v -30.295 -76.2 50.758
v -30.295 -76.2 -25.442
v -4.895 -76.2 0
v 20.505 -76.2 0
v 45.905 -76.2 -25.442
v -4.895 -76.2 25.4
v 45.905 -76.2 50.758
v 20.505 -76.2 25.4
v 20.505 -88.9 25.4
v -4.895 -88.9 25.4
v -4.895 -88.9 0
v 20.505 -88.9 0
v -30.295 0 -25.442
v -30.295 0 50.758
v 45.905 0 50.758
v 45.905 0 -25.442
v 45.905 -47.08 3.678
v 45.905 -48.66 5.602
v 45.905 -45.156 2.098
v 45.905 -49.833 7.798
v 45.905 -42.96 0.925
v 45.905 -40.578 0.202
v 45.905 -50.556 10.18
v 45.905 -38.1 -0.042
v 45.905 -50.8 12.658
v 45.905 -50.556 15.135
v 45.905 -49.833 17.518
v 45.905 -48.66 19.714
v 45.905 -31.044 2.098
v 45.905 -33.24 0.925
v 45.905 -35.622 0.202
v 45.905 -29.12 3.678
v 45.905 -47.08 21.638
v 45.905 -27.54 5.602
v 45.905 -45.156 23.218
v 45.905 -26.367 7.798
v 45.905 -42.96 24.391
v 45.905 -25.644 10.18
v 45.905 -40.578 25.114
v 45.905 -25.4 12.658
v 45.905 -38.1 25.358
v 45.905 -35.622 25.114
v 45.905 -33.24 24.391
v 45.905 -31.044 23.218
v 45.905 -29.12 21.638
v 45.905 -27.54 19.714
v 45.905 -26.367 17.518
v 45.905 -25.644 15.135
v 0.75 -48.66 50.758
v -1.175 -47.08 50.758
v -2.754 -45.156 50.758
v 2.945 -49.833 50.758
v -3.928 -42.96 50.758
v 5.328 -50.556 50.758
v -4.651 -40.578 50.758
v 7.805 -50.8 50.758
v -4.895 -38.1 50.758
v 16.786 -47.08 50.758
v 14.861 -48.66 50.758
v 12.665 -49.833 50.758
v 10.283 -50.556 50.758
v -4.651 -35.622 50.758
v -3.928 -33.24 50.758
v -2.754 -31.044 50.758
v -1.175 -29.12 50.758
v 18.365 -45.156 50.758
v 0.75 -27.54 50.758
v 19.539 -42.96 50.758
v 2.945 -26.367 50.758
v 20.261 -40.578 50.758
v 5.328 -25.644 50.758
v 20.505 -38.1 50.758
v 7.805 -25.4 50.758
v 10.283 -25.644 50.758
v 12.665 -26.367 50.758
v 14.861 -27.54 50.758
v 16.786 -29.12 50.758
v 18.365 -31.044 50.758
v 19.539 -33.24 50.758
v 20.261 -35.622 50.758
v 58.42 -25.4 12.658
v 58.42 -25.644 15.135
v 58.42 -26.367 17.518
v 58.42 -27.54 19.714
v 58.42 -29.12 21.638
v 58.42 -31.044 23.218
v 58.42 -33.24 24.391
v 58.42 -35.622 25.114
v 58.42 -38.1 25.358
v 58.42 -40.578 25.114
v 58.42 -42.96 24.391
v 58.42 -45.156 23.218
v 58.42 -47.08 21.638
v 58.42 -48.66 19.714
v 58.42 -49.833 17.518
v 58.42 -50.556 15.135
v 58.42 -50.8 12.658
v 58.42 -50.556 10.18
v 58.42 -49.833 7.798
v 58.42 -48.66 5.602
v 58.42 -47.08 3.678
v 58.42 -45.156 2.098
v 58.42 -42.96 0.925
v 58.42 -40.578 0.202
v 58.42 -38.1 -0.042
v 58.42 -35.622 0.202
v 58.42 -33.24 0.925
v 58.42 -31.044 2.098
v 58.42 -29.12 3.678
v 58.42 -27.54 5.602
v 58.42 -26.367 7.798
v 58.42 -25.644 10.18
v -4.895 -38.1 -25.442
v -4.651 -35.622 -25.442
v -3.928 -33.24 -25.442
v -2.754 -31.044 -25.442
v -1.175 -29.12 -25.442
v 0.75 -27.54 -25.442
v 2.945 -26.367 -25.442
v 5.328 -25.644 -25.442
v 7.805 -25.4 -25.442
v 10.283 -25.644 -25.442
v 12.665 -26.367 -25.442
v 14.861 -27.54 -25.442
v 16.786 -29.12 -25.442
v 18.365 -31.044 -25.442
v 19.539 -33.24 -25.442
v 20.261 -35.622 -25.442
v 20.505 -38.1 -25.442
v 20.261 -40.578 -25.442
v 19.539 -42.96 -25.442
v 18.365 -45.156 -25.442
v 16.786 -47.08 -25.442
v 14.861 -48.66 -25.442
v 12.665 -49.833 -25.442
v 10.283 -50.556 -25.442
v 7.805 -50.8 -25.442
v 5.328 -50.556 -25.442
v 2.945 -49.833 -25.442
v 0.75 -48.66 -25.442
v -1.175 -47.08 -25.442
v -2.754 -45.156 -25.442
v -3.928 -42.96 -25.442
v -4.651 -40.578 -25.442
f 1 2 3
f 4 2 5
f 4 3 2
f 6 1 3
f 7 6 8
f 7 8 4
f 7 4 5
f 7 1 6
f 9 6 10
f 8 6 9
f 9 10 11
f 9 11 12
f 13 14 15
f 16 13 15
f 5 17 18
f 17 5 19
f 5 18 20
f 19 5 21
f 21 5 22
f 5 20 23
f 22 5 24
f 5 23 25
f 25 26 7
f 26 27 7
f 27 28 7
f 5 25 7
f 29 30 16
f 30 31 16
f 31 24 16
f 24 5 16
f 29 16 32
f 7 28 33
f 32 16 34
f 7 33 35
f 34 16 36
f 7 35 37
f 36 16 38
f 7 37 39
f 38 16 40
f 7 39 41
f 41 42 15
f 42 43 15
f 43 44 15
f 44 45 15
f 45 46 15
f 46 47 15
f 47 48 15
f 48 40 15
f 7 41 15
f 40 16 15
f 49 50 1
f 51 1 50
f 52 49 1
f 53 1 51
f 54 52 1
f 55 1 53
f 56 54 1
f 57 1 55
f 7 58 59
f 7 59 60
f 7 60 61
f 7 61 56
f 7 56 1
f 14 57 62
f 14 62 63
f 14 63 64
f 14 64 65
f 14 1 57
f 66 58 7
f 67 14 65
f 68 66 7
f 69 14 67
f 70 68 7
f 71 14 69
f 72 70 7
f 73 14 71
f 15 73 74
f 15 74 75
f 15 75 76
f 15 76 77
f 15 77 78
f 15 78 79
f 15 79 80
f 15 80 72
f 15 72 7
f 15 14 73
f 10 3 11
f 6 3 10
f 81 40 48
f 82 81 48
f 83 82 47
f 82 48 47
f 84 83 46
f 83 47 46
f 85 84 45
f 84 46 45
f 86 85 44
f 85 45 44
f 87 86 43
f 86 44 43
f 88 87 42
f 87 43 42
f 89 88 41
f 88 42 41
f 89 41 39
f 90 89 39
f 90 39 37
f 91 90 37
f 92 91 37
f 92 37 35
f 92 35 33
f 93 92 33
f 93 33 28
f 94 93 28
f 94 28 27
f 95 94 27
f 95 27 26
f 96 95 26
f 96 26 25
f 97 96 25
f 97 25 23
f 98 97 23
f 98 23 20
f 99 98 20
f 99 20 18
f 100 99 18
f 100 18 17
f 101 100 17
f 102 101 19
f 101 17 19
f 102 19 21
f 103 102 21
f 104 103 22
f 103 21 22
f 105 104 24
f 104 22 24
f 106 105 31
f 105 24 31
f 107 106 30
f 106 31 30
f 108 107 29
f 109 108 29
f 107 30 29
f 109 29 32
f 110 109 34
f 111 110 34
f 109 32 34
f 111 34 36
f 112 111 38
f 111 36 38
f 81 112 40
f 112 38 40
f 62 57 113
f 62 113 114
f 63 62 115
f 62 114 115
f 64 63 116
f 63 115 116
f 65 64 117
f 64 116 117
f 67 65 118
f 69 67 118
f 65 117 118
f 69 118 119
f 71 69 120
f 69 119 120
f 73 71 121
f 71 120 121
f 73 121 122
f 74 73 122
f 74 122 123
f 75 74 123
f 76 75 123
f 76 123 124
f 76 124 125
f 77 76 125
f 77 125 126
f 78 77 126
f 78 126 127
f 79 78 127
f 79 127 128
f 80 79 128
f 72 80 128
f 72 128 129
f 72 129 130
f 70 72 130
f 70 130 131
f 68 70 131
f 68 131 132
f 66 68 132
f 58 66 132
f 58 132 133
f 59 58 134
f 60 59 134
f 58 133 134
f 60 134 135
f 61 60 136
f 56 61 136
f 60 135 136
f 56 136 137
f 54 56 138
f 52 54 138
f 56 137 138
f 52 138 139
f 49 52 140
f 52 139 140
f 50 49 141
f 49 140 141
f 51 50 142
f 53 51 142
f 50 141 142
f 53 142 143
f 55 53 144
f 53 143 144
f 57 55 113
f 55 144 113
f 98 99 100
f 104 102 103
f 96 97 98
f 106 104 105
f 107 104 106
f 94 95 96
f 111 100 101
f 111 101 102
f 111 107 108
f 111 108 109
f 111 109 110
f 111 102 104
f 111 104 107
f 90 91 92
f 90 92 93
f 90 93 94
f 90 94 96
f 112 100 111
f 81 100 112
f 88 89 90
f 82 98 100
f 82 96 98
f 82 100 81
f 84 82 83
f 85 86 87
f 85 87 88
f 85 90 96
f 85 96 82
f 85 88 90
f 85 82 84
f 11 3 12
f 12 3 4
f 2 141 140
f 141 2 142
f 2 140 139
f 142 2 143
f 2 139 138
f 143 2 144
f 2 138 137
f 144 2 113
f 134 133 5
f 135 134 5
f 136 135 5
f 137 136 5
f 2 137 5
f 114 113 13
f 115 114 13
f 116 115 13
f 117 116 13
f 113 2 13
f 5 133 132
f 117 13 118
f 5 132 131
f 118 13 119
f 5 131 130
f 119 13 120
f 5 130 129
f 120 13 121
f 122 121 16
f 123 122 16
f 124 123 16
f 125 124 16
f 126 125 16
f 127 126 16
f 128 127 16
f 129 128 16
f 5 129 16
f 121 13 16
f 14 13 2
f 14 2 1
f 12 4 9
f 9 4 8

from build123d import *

# Parameters (mm, degrees)
F0_W     = 76.2
F0_H     = 76.2
F1_DEPTH = 76.2
F2_R     = 12.7
F3_DEPTH = 58.42
F5_D     = 25.4
F6_W     = 25.4
F6_H     = 25.4
F7_DEPTH = 12.7


with BuildPart() as f1:
    # F0 (on Front) → F1 (new body)
    with BuildSketch(Plane.XZ):
        with Locations((7.805411, 12.657838)):
            Rectangle(F0_W, F0_H)
    extrude(amount=F1_DEPTH)

    # F2 (on Right) → F3 (join)
    with BuildSketch(Plane.YZ):
        with Locations((-38.1, 12.657838)):
            Circle(F2_R)
    extrude(amount=F3_DEPTH)

    # F5 (through all)
    with Locations(Plane.XY.offset(50.757838)):
        with Locations((7.805411, -38.1)):
            Hole(F5_D / 2)

    # F6 (on face) → F7 (join)
    with BuildSketch(Plane.XZ.offset(76.2)):
        with Locations((7.805411, 12.7)):
            Rectangle(F6_W, F6_H)
    extrude(amount=F7_DEPTH)


solid = f1.part
